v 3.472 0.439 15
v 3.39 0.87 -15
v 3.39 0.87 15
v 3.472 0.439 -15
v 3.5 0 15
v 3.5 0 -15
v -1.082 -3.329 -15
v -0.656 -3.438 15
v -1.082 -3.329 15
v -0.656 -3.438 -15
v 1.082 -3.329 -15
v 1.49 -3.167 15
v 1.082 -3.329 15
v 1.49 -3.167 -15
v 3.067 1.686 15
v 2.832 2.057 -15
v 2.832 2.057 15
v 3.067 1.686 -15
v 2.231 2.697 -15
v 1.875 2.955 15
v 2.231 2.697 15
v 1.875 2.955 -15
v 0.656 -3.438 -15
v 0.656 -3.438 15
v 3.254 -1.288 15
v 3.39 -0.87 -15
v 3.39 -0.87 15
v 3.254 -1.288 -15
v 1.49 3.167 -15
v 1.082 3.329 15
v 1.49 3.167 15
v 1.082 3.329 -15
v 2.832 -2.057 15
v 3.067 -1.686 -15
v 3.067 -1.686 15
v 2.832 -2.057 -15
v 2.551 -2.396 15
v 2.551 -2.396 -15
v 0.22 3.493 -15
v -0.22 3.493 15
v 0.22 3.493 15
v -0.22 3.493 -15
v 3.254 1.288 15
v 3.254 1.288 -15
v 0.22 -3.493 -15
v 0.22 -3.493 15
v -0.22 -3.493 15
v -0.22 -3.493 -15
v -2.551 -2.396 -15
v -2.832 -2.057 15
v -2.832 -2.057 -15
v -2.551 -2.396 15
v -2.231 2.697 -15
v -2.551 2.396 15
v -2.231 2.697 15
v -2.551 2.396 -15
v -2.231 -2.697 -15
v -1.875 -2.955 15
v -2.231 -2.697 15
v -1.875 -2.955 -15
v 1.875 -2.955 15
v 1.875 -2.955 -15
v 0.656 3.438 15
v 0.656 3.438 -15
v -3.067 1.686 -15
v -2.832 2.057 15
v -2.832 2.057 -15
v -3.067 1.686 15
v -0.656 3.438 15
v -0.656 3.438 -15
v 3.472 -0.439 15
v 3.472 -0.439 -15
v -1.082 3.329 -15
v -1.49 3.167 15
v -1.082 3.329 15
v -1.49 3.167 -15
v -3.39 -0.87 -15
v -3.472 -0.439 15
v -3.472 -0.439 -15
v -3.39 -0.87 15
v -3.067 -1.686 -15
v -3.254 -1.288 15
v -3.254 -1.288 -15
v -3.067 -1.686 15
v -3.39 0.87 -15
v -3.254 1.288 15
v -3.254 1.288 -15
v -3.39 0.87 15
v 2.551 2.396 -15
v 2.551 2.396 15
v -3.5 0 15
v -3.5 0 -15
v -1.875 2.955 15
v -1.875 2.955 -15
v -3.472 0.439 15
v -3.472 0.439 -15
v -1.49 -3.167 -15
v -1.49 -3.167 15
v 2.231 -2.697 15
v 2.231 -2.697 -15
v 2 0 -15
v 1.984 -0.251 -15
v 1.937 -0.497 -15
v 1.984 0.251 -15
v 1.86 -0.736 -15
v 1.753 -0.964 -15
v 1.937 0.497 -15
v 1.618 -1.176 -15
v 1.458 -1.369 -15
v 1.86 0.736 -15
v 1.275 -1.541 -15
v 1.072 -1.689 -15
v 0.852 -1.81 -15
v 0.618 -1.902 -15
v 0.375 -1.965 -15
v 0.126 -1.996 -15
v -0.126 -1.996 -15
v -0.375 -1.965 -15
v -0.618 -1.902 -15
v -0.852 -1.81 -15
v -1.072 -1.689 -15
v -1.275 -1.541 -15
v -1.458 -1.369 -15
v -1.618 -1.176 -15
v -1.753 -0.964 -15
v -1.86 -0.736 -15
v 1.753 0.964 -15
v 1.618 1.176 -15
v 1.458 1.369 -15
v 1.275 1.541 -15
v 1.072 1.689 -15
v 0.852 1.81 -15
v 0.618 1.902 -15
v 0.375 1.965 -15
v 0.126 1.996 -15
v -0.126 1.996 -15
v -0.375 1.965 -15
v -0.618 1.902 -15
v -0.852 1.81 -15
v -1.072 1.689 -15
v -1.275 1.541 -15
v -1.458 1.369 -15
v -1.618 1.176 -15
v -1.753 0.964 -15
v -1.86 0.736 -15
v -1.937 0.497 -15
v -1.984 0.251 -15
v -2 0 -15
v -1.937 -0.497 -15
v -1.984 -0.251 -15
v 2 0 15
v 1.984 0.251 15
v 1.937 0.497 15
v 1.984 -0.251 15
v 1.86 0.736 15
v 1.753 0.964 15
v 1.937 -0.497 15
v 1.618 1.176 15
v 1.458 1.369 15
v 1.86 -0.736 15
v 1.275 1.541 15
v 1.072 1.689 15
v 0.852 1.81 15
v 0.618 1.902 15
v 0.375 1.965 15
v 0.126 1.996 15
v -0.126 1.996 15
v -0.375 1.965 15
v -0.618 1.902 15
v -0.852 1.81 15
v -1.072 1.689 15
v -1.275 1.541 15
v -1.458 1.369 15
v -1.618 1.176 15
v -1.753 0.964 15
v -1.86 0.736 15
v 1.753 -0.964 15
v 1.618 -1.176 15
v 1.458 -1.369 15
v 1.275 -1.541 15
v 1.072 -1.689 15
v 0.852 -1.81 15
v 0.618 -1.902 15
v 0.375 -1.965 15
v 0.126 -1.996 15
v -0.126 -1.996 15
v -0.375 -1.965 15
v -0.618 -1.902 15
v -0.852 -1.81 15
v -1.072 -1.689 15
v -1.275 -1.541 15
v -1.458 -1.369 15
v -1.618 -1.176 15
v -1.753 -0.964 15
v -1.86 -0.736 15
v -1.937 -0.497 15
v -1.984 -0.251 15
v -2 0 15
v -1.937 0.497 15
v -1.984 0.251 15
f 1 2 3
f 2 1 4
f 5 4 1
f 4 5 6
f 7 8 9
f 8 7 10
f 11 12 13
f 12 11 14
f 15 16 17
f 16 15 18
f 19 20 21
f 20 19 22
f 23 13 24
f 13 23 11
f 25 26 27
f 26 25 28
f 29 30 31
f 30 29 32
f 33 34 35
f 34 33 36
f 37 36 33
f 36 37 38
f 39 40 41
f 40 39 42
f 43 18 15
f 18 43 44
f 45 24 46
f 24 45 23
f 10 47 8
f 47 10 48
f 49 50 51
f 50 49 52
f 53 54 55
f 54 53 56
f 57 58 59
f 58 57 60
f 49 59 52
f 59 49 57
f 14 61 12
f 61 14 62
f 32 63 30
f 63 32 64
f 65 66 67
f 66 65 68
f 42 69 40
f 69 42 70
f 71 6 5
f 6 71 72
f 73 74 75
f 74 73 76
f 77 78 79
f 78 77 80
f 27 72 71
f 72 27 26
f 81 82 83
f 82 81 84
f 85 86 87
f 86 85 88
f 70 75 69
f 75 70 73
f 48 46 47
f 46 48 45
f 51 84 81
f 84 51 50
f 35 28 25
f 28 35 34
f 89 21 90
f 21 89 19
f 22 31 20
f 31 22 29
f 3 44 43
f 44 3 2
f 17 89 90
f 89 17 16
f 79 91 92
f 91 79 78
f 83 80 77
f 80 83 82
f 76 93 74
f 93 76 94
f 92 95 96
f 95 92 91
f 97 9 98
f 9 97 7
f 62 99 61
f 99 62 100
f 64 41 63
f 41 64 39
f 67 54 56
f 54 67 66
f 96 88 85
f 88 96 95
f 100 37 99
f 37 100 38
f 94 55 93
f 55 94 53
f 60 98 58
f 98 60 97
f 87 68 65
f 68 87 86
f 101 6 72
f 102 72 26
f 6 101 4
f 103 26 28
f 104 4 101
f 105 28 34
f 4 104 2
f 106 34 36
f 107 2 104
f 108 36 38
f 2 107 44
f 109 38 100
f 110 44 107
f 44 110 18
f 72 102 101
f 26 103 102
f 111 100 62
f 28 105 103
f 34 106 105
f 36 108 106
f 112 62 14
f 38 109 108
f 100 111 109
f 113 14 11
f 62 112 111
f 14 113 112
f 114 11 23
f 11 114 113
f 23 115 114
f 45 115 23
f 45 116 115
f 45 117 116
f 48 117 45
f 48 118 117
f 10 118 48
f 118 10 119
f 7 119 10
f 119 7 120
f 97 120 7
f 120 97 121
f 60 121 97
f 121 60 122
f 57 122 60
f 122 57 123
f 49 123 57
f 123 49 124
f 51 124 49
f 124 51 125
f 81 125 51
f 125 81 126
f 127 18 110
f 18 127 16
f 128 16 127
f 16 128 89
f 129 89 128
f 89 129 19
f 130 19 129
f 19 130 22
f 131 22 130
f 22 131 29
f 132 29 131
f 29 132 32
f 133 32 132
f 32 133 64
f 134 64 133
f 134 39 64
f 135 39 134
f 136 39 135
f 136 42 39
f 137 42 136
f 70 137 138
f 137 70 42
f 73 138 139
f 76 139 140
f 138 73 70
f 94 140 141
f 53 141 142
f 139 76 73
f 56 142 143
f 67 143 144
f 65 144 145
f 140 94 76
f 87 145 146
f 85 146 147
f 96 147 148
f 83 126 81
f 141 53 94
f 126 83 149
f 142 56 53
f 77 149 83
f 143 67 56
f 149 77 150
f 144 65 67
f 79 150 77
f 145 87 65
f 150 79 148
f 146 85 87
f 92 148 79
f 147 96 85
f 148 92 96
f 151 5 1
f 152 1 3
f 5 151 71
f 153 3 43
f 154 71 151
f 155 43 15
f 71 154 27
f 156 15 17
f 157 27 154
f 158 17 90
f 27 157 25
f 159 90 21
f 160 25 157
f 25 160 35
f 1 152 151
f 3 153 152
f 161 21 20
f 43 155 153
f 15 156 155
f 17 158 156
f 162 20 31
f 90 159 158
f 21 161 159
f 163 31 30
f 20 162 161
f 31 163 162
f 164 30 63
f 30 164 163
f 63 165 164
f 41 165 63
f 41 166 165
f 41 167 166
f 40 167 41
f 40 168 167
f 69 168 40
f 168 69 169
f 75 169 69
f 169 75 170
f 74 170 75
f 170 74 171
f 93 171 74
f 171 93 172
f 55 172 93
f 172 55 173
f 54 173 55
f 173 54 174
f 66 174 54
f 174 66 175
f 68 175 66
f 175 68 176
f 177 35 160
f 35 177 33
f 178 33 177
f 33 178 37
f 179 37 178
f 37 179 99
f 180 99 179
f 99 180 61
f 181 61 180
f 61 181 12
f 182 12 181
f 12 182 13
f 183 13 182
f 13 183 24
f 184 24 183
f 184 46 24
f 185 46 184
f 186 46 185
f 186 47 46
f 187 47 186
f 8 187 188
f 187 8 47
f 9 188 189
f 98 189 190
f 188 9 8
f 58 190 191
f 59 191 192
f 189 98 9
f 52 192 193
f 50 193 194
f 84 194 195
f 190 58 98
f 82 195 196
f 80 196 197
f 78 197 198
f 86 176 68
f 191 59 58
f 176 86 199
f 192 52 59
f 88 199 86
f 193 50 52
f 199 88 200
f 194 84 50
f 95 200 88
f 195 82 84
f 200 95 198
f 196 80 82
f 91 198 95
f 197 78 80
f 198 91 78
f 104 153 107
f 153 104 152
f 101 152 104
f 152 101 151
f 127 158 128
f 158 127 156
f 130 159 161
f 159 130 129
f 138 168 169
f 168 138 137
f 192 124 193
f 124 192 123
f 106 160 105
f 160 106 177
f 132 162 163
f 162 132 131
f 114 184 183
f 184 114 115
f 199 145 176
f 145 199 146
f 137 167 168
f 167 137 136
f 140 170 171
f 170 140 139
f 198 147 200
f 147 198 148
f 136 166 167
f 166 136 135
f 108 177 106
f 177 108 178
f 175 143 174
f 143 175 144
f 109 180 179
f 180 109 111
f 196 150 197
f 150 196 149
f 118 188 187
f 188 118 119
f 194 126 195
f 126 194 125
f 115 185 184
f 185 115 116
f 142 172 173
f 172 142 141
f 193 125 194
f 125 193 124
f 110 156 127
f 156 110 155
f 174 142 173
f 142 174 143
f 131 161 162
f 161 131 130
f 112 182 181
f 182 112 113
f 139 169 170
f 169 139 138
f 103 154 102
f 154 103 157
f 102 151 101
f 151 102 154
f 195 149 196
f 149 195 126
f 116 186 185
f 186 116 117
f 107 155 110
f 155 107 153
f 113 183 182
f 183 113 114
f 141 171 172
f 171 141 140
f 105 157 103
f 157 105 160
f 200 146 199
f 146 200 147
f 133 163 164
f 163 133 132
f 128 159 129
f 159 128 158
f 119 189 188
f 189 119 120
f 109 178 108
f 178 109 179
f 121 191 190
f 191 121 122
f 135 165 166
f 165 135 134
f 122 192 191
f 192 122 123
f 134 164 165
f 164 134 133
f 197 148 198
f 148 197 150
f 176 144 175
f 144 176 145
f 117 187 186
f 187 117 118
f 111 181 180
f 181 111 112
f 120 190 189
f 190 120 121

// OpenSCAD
$fn = 50;


difference() {
	union() {
		translate(v = [0, 0, -15.0000000000]) {
			cylinder(h = 30, r = 3.5000000000);
		}
	}
	union() {
		translate(v = [0, 0, -100.0000000000]) {
			cylinder(h = 200, r = 2.0000000000);
		}
	}
}
